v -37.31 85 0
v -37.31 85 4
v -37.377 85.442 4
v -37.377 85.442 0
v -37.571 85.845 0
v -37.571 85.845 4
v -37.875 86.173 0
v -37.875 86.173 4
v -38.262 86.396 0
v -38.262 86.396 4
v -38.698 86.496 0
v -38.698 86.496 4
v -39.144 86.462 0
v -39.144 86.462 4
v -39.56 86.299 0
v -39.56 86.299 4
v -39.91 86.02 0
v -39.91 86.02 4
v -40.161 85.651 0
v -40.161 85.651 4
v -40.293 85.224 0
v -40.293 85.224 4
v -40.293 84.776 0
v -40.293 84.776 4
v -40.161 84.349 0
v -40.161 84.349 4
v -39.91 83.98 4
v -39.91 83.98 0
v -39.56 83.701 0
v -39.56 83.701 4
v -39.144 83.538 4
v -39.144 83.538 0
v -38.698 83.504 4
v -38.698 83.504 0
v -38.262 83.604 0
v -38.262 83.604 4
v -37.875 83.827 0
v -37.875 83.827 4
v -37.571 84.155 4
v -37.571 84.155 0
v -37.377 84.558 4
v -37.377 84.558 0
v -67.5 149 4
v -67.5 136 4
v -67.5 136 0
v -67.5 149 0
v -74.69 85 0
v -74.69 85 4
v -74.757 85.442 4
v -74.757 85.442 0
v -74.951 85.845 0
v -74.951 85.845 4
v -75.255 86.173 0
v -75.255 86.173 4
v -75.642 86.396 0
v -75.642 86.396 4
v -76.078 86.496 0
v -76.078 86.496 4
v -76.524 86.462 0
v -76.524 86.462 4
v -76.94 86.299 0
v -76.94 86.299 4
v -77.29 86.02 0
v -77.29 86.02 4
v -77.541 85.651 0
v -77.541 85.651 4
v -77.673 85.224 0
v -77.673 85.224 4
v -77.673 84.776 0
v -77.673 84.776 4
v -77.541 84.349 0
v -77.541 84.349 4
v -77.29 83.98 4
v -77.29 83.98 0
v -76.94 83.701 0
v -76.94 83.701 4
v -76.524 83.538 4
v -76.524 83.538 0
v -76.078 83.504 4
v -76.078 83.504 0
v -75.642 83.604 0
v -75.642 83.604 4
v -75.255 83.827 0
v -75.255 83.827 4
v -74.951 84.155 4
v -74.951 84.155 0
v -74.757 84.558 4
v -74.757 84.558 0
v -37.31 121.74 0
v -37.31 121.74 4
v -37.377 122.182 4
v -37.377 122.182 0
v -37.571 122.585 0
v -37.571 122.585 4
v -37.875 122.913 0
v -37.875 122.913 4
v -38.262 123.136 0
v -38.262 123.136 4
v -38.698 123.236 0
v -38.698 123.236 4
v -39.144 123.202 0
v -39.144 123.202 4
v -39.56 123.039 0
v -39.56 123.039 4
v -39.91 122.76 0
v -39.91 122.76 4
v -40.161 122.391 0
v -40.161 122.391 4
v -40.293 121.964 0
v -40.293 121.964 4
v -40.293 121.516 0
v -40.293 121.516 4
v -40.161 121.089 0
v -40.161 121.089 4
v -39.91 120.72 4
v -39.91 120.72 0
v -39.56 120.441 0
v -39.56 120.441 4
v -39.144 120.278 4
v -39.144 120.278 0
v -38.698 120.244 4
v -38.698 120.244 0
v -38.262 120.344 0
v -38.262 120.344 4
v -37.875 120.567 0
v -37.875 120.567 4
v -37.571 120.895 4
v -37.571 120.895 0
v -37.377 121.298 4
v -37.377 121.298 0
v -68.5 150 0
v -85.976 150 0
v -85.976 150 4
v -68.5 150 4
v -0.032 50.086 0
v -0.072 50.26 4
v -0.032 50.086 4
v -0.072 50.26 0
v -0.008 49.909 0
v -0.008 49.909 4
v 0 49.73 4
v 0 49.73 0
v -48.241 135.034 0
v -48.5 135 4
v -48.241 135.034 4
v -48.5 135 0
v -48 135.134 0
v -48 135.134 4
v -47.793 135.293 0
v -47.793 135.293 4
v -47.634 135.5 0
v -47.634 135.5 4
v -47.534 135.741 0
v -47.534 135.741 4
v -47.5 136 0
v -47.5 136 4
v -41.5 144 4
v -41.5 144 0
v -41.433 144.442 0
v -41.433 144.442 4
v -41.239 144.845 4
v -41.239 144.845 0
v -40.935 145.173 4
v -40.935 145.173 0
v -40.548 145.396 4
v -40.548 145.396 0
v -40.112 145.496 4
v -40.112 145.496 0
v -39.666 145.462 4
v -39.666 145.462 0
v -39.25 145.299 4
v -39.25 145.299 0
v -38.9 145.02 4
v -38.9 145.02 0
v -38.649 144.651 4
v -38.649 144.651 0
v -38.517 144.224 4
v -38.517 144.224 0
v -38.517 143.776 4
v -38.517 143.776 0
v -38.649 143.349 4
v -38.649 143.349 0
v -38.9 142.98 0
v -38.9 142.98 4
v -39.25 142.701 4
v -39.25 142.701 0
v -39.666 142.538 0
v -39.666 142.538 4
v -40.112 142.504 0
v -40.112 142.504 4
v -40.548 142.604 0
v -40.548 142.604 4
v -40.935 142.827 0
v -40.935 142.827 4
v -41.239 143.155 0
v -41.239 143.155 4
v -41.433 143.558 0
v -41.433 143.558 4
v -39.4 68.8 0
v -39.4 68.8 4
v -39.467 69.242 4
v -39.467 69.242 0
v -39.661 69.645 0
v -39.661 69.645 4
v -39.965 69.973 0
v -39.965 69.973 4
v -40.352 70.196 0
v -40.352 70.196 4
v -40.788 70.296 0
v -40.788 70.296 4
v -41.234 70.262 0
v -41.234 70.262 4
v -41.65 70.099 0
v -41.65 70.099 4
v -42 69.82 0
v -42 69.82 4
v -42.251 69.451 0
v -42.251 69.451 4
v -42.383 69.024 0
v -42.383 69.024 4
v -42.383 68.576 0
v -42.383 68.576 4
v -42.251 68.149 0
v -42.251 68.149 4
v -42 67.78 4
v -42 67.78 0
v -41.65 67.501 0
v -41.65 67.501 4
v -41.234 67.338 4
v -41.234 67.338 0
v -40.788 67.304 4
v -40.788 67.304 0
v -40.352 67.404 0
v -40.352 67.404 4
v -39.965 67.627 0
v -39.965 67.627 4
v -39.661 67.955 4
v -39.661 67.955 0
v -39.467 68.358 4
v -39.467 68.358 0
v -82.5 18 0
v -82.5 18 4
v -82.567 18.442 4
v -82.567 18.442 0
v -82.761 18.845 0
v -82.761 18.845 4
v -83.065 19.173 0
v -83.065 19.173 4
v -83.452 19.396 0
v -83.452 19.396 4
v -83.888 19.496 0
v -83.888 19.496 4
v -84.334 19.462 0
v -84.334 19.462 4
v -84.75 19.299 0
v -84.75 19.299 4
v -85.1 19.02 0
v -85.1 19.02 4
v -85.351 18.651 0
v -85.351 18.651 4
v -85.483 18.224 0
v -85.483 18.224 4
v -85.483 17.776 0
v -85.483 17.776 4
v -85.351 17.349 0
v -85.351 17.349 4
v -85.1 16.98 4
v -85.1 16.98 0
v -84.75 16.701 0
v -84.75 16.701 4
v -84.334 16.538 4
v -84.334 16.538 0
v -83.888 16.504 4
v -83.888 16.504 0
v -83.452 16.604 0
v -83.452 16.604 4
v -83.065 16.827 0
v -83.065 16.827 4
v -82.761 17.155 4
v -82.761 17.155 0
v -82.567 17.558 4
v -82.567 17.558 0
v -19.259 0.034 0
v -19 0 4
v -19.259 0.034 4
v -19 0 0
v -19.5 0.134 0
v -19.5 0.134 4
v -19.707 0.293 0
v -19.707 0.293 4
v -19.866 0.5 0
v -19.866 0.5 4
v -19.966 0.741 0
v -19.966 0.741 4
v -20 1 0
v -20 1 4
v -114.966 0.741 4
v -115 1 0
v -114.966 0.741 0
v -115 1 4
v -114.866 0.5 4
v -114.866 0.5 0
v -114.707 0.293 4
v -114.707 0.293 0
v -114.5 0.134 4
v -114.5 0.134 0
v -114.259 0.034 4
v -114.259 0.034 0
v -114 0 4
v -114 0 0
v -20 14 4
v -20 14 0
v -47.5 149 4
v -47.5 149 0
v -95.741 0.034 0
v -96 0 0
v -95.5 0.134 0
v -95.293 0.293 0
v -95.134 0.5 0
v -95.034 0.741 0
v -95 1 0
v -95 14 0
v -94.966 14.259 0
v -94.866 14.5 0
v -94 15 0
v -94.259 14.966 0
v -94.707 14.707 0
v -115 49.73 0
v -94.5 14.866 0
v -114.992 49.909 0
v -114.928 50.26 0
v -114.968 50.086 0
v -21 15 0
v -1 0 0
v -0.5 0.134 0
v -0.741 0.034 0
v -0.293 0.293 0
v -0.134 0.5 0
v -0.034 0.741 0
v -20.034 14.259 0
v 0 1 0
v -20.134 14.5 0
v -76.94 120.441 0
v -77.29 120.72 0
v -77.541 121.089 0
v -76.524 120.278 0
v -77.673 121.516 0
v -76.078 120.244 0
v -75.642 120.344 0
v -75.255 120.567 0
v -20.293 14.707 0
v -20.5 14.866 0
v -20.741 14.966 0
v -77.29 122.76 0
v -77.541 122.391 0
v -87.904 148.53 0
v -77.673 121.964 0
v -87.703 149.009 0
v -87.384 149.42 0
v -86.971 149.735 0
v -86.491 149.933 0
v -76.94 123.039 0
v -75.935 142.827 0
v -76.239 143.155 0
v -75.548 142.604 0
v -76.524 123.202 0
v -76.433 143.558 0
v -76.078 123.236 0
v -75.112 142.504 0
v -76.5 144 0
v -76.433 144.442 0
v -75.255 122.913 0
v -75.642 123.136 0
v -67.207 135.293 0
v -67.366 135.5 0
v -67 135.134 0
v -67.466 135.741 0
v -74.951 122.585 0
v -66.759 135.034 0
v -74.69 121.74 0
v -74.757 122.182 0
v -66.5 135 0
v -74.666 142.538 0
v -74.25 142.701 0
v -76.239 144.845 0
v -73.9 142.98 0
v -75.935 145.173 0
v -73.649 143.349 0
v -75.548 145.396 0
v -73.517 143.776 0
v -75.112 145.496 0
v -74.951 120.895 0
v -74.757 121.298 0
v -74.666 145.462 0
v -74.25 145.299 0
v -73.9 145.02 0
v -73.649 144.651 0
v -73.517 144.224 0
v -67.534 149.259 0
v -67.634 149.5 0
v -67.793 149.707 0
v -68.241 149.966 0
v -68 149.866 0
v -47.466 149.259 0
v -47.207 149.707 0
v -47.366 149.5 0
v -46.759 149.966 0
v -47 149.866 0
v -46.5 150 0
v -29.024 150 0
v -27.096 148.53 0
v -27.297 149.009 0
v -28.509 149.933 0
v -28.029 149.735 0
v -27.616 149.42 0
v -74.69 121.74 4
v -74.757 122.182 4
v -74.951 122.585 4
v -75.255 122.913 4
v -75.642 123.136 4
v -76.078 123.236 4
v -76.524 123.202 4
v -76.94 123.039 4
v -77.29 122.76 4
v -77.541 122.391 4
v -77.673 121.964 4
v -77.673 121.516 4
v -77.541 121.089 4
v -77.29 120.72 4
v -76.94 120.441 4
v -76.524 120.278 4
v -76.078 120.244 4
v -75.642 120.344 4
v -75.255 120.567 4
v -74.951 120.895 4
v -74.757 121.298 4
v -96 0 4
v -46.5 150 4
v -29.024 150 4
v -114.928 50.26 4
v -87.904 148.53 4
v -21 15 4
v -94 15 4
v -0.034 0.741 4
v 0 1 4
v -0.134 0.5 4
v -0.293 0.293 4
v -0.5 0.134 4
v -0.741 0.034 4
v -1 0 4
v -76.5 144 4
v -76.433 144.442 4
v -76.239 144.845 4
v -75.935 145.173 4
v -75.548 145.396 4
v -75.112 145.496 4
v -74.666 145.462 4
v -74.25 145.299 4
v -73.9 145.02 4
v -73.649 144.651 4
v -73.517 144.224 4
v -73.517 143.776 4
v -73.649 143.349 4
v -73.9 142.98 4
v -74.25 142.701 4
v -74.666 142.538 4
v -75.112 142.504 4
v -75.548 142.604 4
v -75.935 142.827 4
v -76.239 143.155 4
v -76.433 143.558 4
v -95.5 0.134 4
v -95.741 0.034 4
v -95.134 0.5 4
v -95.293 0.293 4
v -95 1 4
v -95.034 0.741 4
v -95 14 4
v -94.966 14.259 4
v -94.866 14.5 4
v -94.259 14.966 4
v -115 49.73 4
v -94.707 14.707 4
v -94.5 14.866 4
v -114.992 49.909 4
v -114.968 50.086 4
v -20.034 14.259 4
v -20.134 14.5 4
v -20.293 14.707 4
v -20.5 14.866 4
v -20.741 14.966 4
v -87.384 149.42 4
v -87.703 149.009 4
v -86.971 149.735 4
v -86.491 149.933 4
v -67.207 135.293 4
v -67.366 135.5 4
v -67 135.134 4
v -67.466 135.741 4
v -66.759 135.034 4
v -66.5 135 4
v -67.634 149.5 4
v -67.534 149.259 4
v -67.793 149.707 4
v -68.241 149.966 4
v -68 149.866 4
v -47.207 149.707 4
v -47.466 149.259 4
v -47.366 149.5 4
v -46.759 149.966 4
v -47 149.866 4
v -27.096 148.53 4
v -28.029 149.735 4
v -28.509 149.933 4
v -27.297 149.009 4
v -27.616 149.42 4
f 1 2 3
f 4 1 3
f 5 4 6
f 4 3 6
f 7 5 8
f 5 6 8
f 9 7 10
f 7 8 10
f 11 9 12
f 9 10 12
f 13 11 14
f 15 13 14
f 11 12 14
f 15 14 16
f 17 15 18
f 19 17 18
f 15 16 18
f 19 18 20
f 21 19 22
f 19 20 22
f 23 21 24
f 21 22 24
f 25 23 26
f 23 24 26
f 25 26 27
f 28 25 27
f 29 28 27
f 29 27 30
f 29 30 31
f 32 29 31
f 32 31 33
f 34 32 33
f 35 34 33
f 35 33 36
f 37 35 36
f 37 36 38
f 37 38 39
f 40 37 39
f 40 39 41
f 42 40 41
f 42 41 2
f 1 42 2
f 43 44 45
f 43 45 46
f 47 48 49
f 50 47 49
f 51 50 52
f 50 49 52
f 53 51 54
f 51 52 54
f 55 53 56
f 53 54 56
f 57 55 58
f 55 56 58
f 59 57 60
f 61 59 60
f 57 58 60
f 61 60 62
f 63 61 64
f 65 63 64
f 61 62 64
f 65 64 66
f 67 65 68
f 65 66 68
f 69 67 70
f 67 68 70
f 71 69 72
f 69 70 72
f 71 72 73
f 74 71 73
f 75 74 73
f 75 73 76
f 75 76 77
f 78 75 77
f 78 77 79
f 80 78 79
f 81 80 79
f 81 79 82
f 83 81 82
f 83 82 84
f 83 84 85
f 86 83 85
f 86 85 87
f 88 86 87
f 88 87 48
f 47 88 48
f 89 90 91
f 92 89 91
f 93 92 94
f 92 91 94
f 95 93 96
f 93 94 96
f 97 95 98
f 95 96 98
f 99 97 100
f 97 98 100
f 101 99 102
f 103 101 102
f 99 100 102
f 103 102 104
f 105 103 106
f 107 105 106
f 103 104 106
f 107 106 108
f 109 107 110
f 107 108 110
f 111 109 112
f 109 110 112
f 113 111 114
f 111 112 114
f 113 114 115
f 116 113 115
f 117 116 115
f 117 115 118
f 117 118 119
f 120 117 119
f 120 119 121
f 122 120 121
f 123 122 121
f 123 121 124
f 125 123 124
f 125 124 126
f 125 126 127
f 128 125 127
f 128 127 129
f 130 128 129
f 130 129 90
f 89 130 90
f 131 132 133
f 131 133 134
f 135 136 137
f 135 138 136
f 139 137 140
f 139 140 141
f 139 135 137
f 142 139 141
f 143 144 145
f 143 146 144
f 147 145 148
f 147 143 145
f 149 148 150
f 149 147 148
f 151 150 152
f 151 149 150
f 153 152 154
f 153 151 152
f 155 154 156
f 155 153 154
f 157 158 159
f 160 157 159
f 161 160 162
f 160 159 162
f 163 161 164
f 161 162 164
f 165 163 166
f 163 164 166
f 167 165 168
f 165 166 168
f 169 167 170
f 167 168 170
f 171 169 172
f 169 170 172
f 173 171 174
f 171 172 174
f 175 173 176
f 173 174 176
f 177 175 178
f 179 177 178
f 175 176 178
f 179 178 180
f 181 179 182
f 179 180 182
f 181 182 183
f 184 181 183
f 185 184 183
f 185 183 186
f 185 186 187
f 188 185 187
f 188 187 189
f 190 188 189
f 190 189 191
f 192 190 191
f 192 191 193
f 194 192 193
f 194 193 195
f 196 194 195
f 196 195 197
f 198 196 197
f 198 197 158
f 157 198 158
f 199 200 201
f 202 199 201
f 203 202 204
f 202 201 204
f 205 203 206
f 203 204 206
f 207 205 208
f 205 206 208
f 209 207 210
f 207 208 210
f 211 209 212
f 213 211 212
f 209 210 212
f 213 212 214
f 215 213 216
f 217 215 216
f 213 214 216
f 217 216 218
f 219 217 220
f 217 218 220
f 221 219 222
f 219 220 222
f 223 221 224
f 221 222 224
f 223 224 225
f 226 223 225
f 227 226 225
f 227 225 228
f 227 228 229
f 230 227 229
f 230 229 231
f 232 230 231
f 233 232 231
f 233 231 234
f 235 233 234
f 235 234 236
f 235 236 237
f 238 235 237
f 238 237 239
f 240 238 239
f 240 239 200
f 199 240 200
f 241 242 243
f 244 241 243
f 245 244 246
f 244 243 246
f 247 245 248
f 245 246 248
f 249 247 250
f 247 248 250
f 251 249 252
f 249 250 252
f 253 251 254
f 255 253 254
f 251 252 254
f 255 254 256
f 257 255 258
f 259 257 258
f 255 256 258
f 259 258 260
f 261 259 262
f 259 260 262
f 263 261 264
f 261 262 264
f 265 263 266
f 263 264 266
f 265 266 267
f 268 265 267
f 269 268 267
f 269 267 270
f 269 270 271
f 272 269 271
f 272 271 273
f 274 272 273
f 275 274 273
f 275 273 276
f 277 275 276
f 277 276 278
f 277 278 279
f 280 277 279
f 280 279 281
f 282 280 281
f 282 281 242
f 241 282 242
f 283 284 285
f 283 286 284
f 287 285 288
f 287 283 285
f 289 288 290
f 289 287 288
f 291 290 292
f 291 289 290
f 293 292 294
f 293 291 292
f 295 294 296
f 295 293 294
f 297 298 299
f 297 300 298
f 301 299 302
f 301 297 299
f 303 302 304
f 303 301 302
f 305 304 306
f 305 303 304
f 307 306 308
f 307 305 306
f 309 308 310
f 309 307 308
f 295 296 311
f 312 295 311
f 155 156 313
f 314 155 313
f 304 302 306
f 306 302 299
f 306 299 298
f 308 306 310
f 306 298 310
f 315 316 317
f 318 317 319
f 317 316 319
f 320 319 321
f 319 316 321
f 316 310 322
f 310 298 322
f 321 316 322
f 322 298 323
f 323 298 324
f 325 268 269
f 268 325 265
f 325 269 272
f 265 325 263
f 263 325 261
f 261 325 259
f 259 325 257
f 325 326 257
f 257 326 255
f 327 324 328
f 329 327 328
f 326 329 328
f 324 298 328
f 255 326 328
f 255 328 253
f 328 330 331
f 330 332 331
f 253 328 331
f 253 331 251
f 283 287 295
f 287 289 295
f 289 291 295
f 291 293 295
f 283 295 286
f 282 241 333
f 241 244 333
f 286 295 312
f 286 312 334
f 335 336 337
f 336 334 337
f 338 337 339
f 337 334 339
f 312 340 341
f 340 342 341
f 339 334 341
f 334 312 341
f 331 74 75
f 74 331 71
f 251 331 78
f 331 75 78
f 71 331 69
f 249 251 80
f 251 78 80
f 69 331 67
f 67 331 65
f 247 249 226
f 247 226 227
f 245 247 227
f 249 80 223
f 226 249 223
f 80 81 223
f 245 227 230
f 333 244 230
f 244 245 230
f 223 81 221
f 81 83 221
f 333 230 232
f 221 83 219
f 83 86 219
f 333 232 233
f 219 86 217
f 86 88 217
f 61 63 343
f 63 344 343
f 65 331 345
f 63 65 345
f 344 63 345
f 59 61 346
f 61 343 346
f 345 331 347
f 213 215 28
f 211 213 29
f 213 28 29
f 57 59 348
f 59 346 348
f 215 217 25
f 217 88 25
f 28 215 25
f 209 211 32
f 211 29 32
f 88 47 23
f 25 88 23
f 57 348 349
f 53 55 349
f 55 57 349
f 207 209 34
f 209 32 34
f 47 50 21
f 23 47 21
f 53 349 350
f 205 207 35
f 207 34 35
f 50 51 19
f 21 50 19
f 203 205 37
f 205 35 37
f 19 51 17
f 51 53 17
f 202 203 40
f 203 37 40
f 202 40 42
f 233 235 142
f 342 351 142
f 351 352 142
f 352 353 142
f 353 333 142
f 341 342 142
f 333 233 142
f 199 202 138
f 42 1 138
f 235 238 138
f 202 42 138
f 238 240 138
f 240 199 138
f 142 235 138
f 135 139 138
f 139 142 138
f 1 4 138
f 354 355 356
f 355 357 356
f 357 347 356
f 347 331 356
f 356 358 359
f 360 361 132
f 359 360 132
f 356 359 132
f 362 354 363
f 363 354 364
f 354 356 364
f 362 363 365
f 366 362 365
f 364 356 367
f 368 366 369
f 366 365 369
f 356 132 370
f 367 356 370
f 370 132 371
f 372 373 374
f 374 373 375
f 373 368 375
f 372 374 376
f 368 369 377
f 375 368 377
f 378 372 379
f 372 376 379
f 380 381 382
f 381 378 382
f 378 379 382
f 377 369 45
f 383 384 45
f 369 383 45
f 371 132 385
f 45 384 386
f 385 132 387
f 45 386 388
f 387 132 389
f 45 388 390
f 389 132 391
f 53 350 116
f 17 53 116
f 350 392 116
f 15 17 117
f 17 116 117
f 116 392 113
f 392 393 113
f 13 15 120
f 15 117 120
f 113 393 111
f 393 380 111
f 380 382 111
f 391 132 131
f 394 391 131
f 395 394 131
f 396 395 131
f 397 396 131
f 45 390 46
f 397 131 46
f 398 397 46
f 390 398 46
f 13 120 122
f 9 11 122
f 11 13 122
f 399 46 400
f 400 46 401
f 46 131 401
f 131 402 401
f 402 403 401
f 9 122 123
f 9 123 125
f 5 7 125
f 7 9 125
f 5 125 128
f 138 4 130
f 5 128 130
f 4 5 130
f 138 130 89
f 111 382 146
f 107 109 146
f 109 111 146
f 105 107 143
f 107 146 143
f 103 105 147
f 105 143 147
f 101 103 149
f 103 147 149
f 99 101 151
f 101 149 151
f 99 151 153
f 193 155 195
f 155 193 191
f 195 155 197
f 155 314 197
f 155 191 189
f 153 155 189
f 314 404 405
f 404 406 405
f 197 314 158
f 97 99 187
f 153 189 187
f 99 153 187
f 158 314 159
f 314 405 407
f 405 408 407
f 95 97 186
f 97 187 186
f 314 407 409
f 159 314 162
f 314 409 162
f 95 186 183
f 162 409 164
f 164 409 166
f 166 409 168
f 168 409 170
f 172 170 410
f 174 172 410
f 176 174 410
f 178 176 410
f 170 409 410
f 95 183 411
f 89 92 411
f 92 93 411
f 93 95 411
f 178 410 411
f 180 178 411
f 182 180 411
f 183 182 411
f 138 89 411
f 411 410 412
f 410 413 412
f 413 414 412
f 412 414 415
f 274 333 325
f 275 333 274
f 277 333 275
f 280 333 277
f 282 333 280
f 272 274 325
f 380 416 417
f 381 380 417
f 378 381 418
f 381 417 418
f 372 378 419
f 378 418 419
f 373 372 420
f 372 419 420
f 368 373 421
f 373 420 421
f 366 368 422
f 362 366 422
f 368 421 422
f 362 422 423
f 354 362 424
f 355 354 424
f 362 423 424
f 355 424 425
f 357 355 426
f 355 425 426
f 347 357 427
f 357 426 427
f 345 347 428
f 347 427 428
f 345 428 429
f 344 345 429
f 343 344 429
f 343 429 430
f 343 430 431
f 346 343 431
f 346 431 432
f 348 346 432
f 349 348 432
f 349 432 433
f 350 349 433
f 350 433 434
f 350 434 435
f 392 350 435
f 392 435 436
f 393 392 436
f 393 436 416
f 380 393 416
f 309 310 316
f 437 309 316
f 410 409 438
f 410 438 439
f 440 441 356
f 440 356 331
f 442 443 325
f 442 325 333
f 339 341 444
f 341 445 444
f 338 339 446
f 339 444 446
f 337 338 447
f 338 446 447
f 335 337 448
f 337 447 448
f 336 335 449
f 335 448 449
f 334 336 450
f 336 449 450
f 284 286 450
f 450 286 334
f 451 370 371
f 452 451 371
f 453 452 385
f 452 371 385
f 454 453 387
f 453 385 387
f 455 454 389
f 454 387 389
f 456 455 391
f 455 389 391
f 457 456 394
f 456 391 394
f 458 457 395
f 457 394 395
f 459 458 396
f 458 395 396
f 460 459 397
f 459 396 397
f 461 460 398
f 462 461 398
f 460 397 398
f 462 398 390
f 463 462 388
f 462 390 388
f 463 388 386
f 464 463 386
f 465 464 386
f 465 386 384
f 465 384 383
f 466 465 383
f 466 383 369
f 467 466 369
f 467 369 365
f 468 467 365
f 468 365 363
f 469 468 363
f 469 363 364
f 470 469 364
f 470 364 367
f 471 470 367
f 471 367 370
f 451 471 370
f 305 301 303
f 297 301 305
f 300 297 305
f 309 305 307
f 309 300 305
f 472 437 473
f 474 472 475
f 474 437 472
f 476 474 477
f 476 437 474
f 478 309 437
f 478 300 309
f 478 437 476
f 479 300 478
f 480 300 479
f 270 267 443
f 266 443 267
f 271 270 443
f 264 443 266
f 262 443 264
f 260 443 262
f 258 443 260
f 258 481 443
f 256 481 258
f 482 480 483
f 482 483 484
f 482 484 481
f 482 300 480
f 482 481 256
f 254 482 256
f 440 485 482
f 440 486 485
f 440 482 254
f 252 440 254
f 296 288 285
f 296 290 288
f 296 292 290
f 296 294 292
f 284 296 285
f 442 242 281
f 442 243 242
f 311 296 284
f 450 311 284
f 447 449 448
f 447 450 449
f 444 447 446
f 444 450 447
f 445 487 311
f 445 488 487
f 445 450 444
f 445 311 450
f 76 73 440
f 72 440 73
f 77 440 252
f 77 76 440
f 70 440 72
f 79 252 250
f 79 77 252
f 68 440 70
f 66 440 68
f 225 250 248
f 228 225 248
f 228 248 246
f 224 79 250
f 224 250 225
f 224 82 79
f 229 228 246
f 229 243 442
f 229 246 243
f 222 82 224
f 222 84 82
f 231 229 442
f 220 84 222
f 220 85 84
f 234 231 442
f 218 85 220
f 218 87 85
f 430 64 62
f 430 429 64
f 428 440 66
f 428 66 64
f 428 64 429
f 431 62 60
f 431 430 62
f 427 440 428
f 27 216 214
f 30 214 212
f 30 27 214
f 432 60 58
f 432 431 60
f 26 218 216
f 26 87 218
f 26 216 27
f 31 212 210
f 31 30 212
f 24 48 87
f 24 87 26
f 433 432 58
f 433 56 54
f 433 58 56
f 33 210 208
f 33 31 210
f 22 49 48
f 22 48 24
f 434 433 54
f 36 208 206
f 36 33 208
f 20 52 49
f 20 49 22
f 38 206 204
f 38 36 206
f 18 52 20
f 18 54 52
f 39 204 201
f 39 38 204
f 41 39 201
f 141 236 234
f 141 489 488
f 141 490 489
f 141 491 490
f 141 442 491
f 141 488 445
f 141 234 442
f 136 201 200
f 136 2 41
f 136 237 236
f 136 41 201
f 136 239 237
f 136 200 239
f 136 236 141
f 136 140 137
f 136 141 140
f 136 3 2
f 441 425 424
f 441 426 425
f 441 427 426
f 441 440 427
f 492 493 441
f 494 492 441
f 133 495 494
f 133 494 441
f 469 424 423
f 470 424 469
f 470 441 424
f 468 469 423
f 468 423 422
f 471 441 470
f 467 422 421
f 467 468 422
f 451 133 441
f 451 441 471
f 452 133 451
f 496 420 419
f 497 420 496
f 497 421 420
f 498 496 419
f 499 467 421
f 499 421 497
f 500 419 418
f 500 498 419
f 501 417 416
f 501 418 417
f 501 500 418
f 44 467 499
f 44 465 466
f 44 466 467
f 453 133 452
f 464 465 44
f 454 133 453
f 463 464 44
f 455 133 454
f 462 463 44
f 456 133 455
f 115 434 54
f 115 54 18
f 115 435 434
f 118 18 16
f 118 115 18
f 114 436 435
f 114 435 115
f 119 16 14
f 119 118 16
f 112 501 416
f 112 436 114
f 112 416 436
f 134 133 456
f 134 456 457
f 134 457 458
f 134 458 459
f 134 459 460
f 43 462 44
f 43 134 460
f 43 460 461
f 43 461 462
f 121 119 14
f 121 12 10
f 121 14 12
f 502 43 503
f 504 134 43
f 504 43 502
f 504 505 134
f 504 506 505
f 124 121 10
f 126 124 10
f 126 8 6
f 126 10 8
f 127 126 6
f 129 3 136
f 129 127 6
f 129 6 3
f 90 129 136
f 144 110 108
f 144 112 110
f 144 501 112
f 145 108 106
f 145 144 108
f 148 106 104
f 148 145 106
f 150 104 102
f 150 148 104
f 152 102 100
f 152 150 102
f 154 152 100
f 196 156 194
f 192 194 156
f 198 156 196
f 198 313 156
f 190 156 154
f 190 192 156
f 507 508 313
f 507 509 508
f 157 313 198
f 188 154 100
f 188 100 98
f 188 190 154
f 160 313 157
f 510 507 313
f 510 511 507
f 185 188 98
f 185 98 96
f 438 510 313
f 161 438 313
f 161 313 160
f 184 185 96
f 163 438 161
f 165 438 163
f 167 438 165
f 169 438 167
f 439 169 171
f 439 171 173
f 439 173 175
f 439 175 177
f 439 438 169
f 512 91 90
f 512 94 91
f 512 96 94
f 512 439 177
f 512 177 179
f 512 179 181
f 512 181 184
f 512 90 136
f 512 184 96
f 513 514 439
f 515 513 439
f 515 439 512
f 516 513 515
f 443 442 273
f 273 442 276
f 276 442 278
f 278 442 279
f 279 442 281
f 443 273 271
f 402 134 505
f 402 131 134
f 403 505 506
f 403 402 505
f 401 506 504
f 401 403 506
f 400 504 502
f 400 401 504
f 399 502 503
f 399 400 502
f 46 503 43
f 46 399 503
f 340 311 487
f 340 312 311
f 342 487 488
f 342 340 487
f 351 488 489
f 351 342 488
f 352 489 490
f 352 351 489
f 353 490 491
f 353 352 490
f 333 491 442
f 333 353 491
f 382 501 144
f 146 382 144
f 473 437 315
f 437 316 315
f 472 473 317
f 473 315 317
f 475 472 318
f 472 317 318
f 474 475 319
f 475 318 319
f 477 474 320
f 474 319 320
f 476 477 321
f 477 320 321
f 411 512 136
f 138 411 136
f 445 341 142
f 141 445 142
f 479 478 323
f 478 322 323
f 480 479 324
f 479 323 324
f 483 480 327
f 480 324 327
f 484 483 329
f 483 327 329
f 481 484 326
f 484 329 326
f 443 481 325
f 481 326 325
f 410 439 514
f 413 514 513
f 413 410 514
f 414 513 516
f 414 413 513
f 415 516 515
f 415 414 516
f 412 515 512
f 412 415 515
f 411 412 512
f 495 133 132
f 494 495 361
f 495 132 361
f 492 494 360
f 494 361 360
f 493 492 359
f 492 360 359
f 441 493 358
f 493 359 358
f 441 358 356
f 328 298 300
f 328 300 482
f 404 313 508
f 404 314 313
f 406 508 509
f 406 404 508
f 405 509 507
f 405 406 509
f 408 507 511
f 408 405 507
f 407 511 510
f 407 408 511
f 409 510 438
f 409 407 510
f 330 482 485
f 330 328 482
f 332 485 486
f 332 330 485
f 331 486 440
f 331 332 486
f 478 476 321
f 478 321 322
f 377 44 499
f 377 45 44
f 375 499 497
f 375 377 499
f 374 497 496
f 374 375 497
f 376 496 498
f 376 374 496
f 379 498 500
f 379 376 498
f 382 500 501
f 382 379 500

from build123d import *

# Parameters (mm, degrees)
SKETCH6_W           = 115
SKETCH6_H           = 150
BOSS_EXTRUDE2_DEPTH = 4
SKETCH7_W           = 75
SKETCH7_H           = 15
CUT_EXTRUDE1_DEPTH  = 5
FILLET1_R           = 1
SKETCH8_W           = 10
SKETCH8_H           = 15
CUT_EXTRUDE2_DEPTH  = 5
FILLET2_R           = 1
CUT_EXTRUDE3_DEPTH  = 5
FILLET3_R           = 2
SKETCH14_R          = 1.5
CUT_EXTRUDE4_DEPTH  = 5
SKETCH17_R          = 1.5
CUT_EXTRUDE6_DEPTH  = 5
SKETCH18_R          = 1.5
CUT_EXTRUDE7_DEPTH  = 5


with BuildPart() as part:
    # Sketch6 → Boss-Extrude2 (new body)
    with BuildSketch(Plane.XY):
        with Locations((-57.5, 75)):
            Rectangle(SKETCH6_W, SKETCH6_H)
    extrude(amount=BOSS_EXTRUDE2_DEPTH)

    # Sketch7 → Cut-Extrude1 (cut, through all)
    with BuildSketch(Plane.XY.offset(4)):
        with Locations((-57.5, 7.5)):
            Rectangle(SKETCH7_W, SKETCH7_H)
    extrude(amount=-CUT_EXTRUDE1_DEPTH, mode=Mode.SUBTRACT)

    # Fillet1
    fillet1_edges = [part.edges().sort_by_distance(p)[0] for p in [
        (-95, 0, 2),
        (-95, 15, 2),
        (-20, 15, 2),
        (-20, 0, 2),
        (0, 0, 2),
        (-115, 0, 2),
    ]]
    fillet(fillet1_edges, radius=FILLET1_R)

    # Sketch8 → Cut-Extrude2 (cut, through all)
    with BuildSketch(Plane.XY.offset(4)):
        with Locations((-62.5, 142.5)):
            Rectangle(SKETCH8_W, SKETCH8_H)
        with Locations((-52.5, 142.5)):
            Rectangle(SKETCH8_W, SKETCH8_H)
    extrude(amount=-CUT_EXTRUDE2_DEPTH, mode=Mode.SUBTRACT)

    # Fillet2
    fillet2_edges = [part.edges().sort_by_distance(p)[0] for p in [
        (-67.5, 135, 2),
        (-67.5, 150, 2),
        (-47.5, 150, 2),
        (-47.5, 135, 2),
    ]]
    fillet(fillet2_edges, radius=FILLET2_R)

    # Sketch11 → Cut-Extrude3 (cut, through all)
    with BuildSketch(Plane.XY.offset(4)):
        Polygon((-87.5, 150), (-115, 50), (-115, 150), align=None)
        Polygon((0, 50), (0, 150), (-27.5, 150), align=None)
    extrude(amount=-CUT_EXTRUDE3_DEPTH, mode=Mode.SUBTRACT)

    # Fillet3
    fillet3_edges = [part.edges().sort_by_distance(p)[0] for p in [
        (0, 50, 2),
        (-27.5, 150, 2),
        (-87.5, 150, 2),
        (-115, 50, 2),
    ]]
    fillet(fillet3_edges, radius=FILLET3_R)

    # Sketch14 → Cut-Extrude4 (cut, through all)
    with BuildSketch(Plane(origin=(0, 0, 0), x_dir=(-1, 0, 0), z_dir=(0, 0, -1))):
        with Locations((40, 144)):
            Circle(SKETCH14_R)
        with Locations((75, 144)):
            Circle(SKETCH14_R)
    extrude(amount=-CUT_EXTRUDE4_DEPTH, mode=Mode.SUBTRACT)

    # Sketch17 → Cut-Extrude6 (cut, through all)
    with BuildSketch(Plane.XY.offset(4)):
        with Locations((-76.19, 121.74)):
            Circle(SKETCH17_R)
        with Locations((-38.81, 121.74)):
            Circle(SKETCH17_R)
        with Locations((-76.19, 85)):
            Circle(SKETCH17_R)
        with Locations((-38.81, 85)):
            Circle(SKETCH17_R)
    extrude(amount=-CUT_EXTRUDE6_DEPTH, mode=Mode.SUBTRACT)

    # Sketch18 → Cut-Extrude7 (cut, through all)
    with BuildSketch(Plane.XY.offset(4)):
        with Locations((-84, 18)):
            Circle(SKETCH18_R)
        with Locations((-40.9, 68.8)):
            Circle(SKETCH18_R)
    extrude(amount=-CUT_EXTRUDE7_DEPTH, mode=Mode.SUBTRACT)


solid = part.part
